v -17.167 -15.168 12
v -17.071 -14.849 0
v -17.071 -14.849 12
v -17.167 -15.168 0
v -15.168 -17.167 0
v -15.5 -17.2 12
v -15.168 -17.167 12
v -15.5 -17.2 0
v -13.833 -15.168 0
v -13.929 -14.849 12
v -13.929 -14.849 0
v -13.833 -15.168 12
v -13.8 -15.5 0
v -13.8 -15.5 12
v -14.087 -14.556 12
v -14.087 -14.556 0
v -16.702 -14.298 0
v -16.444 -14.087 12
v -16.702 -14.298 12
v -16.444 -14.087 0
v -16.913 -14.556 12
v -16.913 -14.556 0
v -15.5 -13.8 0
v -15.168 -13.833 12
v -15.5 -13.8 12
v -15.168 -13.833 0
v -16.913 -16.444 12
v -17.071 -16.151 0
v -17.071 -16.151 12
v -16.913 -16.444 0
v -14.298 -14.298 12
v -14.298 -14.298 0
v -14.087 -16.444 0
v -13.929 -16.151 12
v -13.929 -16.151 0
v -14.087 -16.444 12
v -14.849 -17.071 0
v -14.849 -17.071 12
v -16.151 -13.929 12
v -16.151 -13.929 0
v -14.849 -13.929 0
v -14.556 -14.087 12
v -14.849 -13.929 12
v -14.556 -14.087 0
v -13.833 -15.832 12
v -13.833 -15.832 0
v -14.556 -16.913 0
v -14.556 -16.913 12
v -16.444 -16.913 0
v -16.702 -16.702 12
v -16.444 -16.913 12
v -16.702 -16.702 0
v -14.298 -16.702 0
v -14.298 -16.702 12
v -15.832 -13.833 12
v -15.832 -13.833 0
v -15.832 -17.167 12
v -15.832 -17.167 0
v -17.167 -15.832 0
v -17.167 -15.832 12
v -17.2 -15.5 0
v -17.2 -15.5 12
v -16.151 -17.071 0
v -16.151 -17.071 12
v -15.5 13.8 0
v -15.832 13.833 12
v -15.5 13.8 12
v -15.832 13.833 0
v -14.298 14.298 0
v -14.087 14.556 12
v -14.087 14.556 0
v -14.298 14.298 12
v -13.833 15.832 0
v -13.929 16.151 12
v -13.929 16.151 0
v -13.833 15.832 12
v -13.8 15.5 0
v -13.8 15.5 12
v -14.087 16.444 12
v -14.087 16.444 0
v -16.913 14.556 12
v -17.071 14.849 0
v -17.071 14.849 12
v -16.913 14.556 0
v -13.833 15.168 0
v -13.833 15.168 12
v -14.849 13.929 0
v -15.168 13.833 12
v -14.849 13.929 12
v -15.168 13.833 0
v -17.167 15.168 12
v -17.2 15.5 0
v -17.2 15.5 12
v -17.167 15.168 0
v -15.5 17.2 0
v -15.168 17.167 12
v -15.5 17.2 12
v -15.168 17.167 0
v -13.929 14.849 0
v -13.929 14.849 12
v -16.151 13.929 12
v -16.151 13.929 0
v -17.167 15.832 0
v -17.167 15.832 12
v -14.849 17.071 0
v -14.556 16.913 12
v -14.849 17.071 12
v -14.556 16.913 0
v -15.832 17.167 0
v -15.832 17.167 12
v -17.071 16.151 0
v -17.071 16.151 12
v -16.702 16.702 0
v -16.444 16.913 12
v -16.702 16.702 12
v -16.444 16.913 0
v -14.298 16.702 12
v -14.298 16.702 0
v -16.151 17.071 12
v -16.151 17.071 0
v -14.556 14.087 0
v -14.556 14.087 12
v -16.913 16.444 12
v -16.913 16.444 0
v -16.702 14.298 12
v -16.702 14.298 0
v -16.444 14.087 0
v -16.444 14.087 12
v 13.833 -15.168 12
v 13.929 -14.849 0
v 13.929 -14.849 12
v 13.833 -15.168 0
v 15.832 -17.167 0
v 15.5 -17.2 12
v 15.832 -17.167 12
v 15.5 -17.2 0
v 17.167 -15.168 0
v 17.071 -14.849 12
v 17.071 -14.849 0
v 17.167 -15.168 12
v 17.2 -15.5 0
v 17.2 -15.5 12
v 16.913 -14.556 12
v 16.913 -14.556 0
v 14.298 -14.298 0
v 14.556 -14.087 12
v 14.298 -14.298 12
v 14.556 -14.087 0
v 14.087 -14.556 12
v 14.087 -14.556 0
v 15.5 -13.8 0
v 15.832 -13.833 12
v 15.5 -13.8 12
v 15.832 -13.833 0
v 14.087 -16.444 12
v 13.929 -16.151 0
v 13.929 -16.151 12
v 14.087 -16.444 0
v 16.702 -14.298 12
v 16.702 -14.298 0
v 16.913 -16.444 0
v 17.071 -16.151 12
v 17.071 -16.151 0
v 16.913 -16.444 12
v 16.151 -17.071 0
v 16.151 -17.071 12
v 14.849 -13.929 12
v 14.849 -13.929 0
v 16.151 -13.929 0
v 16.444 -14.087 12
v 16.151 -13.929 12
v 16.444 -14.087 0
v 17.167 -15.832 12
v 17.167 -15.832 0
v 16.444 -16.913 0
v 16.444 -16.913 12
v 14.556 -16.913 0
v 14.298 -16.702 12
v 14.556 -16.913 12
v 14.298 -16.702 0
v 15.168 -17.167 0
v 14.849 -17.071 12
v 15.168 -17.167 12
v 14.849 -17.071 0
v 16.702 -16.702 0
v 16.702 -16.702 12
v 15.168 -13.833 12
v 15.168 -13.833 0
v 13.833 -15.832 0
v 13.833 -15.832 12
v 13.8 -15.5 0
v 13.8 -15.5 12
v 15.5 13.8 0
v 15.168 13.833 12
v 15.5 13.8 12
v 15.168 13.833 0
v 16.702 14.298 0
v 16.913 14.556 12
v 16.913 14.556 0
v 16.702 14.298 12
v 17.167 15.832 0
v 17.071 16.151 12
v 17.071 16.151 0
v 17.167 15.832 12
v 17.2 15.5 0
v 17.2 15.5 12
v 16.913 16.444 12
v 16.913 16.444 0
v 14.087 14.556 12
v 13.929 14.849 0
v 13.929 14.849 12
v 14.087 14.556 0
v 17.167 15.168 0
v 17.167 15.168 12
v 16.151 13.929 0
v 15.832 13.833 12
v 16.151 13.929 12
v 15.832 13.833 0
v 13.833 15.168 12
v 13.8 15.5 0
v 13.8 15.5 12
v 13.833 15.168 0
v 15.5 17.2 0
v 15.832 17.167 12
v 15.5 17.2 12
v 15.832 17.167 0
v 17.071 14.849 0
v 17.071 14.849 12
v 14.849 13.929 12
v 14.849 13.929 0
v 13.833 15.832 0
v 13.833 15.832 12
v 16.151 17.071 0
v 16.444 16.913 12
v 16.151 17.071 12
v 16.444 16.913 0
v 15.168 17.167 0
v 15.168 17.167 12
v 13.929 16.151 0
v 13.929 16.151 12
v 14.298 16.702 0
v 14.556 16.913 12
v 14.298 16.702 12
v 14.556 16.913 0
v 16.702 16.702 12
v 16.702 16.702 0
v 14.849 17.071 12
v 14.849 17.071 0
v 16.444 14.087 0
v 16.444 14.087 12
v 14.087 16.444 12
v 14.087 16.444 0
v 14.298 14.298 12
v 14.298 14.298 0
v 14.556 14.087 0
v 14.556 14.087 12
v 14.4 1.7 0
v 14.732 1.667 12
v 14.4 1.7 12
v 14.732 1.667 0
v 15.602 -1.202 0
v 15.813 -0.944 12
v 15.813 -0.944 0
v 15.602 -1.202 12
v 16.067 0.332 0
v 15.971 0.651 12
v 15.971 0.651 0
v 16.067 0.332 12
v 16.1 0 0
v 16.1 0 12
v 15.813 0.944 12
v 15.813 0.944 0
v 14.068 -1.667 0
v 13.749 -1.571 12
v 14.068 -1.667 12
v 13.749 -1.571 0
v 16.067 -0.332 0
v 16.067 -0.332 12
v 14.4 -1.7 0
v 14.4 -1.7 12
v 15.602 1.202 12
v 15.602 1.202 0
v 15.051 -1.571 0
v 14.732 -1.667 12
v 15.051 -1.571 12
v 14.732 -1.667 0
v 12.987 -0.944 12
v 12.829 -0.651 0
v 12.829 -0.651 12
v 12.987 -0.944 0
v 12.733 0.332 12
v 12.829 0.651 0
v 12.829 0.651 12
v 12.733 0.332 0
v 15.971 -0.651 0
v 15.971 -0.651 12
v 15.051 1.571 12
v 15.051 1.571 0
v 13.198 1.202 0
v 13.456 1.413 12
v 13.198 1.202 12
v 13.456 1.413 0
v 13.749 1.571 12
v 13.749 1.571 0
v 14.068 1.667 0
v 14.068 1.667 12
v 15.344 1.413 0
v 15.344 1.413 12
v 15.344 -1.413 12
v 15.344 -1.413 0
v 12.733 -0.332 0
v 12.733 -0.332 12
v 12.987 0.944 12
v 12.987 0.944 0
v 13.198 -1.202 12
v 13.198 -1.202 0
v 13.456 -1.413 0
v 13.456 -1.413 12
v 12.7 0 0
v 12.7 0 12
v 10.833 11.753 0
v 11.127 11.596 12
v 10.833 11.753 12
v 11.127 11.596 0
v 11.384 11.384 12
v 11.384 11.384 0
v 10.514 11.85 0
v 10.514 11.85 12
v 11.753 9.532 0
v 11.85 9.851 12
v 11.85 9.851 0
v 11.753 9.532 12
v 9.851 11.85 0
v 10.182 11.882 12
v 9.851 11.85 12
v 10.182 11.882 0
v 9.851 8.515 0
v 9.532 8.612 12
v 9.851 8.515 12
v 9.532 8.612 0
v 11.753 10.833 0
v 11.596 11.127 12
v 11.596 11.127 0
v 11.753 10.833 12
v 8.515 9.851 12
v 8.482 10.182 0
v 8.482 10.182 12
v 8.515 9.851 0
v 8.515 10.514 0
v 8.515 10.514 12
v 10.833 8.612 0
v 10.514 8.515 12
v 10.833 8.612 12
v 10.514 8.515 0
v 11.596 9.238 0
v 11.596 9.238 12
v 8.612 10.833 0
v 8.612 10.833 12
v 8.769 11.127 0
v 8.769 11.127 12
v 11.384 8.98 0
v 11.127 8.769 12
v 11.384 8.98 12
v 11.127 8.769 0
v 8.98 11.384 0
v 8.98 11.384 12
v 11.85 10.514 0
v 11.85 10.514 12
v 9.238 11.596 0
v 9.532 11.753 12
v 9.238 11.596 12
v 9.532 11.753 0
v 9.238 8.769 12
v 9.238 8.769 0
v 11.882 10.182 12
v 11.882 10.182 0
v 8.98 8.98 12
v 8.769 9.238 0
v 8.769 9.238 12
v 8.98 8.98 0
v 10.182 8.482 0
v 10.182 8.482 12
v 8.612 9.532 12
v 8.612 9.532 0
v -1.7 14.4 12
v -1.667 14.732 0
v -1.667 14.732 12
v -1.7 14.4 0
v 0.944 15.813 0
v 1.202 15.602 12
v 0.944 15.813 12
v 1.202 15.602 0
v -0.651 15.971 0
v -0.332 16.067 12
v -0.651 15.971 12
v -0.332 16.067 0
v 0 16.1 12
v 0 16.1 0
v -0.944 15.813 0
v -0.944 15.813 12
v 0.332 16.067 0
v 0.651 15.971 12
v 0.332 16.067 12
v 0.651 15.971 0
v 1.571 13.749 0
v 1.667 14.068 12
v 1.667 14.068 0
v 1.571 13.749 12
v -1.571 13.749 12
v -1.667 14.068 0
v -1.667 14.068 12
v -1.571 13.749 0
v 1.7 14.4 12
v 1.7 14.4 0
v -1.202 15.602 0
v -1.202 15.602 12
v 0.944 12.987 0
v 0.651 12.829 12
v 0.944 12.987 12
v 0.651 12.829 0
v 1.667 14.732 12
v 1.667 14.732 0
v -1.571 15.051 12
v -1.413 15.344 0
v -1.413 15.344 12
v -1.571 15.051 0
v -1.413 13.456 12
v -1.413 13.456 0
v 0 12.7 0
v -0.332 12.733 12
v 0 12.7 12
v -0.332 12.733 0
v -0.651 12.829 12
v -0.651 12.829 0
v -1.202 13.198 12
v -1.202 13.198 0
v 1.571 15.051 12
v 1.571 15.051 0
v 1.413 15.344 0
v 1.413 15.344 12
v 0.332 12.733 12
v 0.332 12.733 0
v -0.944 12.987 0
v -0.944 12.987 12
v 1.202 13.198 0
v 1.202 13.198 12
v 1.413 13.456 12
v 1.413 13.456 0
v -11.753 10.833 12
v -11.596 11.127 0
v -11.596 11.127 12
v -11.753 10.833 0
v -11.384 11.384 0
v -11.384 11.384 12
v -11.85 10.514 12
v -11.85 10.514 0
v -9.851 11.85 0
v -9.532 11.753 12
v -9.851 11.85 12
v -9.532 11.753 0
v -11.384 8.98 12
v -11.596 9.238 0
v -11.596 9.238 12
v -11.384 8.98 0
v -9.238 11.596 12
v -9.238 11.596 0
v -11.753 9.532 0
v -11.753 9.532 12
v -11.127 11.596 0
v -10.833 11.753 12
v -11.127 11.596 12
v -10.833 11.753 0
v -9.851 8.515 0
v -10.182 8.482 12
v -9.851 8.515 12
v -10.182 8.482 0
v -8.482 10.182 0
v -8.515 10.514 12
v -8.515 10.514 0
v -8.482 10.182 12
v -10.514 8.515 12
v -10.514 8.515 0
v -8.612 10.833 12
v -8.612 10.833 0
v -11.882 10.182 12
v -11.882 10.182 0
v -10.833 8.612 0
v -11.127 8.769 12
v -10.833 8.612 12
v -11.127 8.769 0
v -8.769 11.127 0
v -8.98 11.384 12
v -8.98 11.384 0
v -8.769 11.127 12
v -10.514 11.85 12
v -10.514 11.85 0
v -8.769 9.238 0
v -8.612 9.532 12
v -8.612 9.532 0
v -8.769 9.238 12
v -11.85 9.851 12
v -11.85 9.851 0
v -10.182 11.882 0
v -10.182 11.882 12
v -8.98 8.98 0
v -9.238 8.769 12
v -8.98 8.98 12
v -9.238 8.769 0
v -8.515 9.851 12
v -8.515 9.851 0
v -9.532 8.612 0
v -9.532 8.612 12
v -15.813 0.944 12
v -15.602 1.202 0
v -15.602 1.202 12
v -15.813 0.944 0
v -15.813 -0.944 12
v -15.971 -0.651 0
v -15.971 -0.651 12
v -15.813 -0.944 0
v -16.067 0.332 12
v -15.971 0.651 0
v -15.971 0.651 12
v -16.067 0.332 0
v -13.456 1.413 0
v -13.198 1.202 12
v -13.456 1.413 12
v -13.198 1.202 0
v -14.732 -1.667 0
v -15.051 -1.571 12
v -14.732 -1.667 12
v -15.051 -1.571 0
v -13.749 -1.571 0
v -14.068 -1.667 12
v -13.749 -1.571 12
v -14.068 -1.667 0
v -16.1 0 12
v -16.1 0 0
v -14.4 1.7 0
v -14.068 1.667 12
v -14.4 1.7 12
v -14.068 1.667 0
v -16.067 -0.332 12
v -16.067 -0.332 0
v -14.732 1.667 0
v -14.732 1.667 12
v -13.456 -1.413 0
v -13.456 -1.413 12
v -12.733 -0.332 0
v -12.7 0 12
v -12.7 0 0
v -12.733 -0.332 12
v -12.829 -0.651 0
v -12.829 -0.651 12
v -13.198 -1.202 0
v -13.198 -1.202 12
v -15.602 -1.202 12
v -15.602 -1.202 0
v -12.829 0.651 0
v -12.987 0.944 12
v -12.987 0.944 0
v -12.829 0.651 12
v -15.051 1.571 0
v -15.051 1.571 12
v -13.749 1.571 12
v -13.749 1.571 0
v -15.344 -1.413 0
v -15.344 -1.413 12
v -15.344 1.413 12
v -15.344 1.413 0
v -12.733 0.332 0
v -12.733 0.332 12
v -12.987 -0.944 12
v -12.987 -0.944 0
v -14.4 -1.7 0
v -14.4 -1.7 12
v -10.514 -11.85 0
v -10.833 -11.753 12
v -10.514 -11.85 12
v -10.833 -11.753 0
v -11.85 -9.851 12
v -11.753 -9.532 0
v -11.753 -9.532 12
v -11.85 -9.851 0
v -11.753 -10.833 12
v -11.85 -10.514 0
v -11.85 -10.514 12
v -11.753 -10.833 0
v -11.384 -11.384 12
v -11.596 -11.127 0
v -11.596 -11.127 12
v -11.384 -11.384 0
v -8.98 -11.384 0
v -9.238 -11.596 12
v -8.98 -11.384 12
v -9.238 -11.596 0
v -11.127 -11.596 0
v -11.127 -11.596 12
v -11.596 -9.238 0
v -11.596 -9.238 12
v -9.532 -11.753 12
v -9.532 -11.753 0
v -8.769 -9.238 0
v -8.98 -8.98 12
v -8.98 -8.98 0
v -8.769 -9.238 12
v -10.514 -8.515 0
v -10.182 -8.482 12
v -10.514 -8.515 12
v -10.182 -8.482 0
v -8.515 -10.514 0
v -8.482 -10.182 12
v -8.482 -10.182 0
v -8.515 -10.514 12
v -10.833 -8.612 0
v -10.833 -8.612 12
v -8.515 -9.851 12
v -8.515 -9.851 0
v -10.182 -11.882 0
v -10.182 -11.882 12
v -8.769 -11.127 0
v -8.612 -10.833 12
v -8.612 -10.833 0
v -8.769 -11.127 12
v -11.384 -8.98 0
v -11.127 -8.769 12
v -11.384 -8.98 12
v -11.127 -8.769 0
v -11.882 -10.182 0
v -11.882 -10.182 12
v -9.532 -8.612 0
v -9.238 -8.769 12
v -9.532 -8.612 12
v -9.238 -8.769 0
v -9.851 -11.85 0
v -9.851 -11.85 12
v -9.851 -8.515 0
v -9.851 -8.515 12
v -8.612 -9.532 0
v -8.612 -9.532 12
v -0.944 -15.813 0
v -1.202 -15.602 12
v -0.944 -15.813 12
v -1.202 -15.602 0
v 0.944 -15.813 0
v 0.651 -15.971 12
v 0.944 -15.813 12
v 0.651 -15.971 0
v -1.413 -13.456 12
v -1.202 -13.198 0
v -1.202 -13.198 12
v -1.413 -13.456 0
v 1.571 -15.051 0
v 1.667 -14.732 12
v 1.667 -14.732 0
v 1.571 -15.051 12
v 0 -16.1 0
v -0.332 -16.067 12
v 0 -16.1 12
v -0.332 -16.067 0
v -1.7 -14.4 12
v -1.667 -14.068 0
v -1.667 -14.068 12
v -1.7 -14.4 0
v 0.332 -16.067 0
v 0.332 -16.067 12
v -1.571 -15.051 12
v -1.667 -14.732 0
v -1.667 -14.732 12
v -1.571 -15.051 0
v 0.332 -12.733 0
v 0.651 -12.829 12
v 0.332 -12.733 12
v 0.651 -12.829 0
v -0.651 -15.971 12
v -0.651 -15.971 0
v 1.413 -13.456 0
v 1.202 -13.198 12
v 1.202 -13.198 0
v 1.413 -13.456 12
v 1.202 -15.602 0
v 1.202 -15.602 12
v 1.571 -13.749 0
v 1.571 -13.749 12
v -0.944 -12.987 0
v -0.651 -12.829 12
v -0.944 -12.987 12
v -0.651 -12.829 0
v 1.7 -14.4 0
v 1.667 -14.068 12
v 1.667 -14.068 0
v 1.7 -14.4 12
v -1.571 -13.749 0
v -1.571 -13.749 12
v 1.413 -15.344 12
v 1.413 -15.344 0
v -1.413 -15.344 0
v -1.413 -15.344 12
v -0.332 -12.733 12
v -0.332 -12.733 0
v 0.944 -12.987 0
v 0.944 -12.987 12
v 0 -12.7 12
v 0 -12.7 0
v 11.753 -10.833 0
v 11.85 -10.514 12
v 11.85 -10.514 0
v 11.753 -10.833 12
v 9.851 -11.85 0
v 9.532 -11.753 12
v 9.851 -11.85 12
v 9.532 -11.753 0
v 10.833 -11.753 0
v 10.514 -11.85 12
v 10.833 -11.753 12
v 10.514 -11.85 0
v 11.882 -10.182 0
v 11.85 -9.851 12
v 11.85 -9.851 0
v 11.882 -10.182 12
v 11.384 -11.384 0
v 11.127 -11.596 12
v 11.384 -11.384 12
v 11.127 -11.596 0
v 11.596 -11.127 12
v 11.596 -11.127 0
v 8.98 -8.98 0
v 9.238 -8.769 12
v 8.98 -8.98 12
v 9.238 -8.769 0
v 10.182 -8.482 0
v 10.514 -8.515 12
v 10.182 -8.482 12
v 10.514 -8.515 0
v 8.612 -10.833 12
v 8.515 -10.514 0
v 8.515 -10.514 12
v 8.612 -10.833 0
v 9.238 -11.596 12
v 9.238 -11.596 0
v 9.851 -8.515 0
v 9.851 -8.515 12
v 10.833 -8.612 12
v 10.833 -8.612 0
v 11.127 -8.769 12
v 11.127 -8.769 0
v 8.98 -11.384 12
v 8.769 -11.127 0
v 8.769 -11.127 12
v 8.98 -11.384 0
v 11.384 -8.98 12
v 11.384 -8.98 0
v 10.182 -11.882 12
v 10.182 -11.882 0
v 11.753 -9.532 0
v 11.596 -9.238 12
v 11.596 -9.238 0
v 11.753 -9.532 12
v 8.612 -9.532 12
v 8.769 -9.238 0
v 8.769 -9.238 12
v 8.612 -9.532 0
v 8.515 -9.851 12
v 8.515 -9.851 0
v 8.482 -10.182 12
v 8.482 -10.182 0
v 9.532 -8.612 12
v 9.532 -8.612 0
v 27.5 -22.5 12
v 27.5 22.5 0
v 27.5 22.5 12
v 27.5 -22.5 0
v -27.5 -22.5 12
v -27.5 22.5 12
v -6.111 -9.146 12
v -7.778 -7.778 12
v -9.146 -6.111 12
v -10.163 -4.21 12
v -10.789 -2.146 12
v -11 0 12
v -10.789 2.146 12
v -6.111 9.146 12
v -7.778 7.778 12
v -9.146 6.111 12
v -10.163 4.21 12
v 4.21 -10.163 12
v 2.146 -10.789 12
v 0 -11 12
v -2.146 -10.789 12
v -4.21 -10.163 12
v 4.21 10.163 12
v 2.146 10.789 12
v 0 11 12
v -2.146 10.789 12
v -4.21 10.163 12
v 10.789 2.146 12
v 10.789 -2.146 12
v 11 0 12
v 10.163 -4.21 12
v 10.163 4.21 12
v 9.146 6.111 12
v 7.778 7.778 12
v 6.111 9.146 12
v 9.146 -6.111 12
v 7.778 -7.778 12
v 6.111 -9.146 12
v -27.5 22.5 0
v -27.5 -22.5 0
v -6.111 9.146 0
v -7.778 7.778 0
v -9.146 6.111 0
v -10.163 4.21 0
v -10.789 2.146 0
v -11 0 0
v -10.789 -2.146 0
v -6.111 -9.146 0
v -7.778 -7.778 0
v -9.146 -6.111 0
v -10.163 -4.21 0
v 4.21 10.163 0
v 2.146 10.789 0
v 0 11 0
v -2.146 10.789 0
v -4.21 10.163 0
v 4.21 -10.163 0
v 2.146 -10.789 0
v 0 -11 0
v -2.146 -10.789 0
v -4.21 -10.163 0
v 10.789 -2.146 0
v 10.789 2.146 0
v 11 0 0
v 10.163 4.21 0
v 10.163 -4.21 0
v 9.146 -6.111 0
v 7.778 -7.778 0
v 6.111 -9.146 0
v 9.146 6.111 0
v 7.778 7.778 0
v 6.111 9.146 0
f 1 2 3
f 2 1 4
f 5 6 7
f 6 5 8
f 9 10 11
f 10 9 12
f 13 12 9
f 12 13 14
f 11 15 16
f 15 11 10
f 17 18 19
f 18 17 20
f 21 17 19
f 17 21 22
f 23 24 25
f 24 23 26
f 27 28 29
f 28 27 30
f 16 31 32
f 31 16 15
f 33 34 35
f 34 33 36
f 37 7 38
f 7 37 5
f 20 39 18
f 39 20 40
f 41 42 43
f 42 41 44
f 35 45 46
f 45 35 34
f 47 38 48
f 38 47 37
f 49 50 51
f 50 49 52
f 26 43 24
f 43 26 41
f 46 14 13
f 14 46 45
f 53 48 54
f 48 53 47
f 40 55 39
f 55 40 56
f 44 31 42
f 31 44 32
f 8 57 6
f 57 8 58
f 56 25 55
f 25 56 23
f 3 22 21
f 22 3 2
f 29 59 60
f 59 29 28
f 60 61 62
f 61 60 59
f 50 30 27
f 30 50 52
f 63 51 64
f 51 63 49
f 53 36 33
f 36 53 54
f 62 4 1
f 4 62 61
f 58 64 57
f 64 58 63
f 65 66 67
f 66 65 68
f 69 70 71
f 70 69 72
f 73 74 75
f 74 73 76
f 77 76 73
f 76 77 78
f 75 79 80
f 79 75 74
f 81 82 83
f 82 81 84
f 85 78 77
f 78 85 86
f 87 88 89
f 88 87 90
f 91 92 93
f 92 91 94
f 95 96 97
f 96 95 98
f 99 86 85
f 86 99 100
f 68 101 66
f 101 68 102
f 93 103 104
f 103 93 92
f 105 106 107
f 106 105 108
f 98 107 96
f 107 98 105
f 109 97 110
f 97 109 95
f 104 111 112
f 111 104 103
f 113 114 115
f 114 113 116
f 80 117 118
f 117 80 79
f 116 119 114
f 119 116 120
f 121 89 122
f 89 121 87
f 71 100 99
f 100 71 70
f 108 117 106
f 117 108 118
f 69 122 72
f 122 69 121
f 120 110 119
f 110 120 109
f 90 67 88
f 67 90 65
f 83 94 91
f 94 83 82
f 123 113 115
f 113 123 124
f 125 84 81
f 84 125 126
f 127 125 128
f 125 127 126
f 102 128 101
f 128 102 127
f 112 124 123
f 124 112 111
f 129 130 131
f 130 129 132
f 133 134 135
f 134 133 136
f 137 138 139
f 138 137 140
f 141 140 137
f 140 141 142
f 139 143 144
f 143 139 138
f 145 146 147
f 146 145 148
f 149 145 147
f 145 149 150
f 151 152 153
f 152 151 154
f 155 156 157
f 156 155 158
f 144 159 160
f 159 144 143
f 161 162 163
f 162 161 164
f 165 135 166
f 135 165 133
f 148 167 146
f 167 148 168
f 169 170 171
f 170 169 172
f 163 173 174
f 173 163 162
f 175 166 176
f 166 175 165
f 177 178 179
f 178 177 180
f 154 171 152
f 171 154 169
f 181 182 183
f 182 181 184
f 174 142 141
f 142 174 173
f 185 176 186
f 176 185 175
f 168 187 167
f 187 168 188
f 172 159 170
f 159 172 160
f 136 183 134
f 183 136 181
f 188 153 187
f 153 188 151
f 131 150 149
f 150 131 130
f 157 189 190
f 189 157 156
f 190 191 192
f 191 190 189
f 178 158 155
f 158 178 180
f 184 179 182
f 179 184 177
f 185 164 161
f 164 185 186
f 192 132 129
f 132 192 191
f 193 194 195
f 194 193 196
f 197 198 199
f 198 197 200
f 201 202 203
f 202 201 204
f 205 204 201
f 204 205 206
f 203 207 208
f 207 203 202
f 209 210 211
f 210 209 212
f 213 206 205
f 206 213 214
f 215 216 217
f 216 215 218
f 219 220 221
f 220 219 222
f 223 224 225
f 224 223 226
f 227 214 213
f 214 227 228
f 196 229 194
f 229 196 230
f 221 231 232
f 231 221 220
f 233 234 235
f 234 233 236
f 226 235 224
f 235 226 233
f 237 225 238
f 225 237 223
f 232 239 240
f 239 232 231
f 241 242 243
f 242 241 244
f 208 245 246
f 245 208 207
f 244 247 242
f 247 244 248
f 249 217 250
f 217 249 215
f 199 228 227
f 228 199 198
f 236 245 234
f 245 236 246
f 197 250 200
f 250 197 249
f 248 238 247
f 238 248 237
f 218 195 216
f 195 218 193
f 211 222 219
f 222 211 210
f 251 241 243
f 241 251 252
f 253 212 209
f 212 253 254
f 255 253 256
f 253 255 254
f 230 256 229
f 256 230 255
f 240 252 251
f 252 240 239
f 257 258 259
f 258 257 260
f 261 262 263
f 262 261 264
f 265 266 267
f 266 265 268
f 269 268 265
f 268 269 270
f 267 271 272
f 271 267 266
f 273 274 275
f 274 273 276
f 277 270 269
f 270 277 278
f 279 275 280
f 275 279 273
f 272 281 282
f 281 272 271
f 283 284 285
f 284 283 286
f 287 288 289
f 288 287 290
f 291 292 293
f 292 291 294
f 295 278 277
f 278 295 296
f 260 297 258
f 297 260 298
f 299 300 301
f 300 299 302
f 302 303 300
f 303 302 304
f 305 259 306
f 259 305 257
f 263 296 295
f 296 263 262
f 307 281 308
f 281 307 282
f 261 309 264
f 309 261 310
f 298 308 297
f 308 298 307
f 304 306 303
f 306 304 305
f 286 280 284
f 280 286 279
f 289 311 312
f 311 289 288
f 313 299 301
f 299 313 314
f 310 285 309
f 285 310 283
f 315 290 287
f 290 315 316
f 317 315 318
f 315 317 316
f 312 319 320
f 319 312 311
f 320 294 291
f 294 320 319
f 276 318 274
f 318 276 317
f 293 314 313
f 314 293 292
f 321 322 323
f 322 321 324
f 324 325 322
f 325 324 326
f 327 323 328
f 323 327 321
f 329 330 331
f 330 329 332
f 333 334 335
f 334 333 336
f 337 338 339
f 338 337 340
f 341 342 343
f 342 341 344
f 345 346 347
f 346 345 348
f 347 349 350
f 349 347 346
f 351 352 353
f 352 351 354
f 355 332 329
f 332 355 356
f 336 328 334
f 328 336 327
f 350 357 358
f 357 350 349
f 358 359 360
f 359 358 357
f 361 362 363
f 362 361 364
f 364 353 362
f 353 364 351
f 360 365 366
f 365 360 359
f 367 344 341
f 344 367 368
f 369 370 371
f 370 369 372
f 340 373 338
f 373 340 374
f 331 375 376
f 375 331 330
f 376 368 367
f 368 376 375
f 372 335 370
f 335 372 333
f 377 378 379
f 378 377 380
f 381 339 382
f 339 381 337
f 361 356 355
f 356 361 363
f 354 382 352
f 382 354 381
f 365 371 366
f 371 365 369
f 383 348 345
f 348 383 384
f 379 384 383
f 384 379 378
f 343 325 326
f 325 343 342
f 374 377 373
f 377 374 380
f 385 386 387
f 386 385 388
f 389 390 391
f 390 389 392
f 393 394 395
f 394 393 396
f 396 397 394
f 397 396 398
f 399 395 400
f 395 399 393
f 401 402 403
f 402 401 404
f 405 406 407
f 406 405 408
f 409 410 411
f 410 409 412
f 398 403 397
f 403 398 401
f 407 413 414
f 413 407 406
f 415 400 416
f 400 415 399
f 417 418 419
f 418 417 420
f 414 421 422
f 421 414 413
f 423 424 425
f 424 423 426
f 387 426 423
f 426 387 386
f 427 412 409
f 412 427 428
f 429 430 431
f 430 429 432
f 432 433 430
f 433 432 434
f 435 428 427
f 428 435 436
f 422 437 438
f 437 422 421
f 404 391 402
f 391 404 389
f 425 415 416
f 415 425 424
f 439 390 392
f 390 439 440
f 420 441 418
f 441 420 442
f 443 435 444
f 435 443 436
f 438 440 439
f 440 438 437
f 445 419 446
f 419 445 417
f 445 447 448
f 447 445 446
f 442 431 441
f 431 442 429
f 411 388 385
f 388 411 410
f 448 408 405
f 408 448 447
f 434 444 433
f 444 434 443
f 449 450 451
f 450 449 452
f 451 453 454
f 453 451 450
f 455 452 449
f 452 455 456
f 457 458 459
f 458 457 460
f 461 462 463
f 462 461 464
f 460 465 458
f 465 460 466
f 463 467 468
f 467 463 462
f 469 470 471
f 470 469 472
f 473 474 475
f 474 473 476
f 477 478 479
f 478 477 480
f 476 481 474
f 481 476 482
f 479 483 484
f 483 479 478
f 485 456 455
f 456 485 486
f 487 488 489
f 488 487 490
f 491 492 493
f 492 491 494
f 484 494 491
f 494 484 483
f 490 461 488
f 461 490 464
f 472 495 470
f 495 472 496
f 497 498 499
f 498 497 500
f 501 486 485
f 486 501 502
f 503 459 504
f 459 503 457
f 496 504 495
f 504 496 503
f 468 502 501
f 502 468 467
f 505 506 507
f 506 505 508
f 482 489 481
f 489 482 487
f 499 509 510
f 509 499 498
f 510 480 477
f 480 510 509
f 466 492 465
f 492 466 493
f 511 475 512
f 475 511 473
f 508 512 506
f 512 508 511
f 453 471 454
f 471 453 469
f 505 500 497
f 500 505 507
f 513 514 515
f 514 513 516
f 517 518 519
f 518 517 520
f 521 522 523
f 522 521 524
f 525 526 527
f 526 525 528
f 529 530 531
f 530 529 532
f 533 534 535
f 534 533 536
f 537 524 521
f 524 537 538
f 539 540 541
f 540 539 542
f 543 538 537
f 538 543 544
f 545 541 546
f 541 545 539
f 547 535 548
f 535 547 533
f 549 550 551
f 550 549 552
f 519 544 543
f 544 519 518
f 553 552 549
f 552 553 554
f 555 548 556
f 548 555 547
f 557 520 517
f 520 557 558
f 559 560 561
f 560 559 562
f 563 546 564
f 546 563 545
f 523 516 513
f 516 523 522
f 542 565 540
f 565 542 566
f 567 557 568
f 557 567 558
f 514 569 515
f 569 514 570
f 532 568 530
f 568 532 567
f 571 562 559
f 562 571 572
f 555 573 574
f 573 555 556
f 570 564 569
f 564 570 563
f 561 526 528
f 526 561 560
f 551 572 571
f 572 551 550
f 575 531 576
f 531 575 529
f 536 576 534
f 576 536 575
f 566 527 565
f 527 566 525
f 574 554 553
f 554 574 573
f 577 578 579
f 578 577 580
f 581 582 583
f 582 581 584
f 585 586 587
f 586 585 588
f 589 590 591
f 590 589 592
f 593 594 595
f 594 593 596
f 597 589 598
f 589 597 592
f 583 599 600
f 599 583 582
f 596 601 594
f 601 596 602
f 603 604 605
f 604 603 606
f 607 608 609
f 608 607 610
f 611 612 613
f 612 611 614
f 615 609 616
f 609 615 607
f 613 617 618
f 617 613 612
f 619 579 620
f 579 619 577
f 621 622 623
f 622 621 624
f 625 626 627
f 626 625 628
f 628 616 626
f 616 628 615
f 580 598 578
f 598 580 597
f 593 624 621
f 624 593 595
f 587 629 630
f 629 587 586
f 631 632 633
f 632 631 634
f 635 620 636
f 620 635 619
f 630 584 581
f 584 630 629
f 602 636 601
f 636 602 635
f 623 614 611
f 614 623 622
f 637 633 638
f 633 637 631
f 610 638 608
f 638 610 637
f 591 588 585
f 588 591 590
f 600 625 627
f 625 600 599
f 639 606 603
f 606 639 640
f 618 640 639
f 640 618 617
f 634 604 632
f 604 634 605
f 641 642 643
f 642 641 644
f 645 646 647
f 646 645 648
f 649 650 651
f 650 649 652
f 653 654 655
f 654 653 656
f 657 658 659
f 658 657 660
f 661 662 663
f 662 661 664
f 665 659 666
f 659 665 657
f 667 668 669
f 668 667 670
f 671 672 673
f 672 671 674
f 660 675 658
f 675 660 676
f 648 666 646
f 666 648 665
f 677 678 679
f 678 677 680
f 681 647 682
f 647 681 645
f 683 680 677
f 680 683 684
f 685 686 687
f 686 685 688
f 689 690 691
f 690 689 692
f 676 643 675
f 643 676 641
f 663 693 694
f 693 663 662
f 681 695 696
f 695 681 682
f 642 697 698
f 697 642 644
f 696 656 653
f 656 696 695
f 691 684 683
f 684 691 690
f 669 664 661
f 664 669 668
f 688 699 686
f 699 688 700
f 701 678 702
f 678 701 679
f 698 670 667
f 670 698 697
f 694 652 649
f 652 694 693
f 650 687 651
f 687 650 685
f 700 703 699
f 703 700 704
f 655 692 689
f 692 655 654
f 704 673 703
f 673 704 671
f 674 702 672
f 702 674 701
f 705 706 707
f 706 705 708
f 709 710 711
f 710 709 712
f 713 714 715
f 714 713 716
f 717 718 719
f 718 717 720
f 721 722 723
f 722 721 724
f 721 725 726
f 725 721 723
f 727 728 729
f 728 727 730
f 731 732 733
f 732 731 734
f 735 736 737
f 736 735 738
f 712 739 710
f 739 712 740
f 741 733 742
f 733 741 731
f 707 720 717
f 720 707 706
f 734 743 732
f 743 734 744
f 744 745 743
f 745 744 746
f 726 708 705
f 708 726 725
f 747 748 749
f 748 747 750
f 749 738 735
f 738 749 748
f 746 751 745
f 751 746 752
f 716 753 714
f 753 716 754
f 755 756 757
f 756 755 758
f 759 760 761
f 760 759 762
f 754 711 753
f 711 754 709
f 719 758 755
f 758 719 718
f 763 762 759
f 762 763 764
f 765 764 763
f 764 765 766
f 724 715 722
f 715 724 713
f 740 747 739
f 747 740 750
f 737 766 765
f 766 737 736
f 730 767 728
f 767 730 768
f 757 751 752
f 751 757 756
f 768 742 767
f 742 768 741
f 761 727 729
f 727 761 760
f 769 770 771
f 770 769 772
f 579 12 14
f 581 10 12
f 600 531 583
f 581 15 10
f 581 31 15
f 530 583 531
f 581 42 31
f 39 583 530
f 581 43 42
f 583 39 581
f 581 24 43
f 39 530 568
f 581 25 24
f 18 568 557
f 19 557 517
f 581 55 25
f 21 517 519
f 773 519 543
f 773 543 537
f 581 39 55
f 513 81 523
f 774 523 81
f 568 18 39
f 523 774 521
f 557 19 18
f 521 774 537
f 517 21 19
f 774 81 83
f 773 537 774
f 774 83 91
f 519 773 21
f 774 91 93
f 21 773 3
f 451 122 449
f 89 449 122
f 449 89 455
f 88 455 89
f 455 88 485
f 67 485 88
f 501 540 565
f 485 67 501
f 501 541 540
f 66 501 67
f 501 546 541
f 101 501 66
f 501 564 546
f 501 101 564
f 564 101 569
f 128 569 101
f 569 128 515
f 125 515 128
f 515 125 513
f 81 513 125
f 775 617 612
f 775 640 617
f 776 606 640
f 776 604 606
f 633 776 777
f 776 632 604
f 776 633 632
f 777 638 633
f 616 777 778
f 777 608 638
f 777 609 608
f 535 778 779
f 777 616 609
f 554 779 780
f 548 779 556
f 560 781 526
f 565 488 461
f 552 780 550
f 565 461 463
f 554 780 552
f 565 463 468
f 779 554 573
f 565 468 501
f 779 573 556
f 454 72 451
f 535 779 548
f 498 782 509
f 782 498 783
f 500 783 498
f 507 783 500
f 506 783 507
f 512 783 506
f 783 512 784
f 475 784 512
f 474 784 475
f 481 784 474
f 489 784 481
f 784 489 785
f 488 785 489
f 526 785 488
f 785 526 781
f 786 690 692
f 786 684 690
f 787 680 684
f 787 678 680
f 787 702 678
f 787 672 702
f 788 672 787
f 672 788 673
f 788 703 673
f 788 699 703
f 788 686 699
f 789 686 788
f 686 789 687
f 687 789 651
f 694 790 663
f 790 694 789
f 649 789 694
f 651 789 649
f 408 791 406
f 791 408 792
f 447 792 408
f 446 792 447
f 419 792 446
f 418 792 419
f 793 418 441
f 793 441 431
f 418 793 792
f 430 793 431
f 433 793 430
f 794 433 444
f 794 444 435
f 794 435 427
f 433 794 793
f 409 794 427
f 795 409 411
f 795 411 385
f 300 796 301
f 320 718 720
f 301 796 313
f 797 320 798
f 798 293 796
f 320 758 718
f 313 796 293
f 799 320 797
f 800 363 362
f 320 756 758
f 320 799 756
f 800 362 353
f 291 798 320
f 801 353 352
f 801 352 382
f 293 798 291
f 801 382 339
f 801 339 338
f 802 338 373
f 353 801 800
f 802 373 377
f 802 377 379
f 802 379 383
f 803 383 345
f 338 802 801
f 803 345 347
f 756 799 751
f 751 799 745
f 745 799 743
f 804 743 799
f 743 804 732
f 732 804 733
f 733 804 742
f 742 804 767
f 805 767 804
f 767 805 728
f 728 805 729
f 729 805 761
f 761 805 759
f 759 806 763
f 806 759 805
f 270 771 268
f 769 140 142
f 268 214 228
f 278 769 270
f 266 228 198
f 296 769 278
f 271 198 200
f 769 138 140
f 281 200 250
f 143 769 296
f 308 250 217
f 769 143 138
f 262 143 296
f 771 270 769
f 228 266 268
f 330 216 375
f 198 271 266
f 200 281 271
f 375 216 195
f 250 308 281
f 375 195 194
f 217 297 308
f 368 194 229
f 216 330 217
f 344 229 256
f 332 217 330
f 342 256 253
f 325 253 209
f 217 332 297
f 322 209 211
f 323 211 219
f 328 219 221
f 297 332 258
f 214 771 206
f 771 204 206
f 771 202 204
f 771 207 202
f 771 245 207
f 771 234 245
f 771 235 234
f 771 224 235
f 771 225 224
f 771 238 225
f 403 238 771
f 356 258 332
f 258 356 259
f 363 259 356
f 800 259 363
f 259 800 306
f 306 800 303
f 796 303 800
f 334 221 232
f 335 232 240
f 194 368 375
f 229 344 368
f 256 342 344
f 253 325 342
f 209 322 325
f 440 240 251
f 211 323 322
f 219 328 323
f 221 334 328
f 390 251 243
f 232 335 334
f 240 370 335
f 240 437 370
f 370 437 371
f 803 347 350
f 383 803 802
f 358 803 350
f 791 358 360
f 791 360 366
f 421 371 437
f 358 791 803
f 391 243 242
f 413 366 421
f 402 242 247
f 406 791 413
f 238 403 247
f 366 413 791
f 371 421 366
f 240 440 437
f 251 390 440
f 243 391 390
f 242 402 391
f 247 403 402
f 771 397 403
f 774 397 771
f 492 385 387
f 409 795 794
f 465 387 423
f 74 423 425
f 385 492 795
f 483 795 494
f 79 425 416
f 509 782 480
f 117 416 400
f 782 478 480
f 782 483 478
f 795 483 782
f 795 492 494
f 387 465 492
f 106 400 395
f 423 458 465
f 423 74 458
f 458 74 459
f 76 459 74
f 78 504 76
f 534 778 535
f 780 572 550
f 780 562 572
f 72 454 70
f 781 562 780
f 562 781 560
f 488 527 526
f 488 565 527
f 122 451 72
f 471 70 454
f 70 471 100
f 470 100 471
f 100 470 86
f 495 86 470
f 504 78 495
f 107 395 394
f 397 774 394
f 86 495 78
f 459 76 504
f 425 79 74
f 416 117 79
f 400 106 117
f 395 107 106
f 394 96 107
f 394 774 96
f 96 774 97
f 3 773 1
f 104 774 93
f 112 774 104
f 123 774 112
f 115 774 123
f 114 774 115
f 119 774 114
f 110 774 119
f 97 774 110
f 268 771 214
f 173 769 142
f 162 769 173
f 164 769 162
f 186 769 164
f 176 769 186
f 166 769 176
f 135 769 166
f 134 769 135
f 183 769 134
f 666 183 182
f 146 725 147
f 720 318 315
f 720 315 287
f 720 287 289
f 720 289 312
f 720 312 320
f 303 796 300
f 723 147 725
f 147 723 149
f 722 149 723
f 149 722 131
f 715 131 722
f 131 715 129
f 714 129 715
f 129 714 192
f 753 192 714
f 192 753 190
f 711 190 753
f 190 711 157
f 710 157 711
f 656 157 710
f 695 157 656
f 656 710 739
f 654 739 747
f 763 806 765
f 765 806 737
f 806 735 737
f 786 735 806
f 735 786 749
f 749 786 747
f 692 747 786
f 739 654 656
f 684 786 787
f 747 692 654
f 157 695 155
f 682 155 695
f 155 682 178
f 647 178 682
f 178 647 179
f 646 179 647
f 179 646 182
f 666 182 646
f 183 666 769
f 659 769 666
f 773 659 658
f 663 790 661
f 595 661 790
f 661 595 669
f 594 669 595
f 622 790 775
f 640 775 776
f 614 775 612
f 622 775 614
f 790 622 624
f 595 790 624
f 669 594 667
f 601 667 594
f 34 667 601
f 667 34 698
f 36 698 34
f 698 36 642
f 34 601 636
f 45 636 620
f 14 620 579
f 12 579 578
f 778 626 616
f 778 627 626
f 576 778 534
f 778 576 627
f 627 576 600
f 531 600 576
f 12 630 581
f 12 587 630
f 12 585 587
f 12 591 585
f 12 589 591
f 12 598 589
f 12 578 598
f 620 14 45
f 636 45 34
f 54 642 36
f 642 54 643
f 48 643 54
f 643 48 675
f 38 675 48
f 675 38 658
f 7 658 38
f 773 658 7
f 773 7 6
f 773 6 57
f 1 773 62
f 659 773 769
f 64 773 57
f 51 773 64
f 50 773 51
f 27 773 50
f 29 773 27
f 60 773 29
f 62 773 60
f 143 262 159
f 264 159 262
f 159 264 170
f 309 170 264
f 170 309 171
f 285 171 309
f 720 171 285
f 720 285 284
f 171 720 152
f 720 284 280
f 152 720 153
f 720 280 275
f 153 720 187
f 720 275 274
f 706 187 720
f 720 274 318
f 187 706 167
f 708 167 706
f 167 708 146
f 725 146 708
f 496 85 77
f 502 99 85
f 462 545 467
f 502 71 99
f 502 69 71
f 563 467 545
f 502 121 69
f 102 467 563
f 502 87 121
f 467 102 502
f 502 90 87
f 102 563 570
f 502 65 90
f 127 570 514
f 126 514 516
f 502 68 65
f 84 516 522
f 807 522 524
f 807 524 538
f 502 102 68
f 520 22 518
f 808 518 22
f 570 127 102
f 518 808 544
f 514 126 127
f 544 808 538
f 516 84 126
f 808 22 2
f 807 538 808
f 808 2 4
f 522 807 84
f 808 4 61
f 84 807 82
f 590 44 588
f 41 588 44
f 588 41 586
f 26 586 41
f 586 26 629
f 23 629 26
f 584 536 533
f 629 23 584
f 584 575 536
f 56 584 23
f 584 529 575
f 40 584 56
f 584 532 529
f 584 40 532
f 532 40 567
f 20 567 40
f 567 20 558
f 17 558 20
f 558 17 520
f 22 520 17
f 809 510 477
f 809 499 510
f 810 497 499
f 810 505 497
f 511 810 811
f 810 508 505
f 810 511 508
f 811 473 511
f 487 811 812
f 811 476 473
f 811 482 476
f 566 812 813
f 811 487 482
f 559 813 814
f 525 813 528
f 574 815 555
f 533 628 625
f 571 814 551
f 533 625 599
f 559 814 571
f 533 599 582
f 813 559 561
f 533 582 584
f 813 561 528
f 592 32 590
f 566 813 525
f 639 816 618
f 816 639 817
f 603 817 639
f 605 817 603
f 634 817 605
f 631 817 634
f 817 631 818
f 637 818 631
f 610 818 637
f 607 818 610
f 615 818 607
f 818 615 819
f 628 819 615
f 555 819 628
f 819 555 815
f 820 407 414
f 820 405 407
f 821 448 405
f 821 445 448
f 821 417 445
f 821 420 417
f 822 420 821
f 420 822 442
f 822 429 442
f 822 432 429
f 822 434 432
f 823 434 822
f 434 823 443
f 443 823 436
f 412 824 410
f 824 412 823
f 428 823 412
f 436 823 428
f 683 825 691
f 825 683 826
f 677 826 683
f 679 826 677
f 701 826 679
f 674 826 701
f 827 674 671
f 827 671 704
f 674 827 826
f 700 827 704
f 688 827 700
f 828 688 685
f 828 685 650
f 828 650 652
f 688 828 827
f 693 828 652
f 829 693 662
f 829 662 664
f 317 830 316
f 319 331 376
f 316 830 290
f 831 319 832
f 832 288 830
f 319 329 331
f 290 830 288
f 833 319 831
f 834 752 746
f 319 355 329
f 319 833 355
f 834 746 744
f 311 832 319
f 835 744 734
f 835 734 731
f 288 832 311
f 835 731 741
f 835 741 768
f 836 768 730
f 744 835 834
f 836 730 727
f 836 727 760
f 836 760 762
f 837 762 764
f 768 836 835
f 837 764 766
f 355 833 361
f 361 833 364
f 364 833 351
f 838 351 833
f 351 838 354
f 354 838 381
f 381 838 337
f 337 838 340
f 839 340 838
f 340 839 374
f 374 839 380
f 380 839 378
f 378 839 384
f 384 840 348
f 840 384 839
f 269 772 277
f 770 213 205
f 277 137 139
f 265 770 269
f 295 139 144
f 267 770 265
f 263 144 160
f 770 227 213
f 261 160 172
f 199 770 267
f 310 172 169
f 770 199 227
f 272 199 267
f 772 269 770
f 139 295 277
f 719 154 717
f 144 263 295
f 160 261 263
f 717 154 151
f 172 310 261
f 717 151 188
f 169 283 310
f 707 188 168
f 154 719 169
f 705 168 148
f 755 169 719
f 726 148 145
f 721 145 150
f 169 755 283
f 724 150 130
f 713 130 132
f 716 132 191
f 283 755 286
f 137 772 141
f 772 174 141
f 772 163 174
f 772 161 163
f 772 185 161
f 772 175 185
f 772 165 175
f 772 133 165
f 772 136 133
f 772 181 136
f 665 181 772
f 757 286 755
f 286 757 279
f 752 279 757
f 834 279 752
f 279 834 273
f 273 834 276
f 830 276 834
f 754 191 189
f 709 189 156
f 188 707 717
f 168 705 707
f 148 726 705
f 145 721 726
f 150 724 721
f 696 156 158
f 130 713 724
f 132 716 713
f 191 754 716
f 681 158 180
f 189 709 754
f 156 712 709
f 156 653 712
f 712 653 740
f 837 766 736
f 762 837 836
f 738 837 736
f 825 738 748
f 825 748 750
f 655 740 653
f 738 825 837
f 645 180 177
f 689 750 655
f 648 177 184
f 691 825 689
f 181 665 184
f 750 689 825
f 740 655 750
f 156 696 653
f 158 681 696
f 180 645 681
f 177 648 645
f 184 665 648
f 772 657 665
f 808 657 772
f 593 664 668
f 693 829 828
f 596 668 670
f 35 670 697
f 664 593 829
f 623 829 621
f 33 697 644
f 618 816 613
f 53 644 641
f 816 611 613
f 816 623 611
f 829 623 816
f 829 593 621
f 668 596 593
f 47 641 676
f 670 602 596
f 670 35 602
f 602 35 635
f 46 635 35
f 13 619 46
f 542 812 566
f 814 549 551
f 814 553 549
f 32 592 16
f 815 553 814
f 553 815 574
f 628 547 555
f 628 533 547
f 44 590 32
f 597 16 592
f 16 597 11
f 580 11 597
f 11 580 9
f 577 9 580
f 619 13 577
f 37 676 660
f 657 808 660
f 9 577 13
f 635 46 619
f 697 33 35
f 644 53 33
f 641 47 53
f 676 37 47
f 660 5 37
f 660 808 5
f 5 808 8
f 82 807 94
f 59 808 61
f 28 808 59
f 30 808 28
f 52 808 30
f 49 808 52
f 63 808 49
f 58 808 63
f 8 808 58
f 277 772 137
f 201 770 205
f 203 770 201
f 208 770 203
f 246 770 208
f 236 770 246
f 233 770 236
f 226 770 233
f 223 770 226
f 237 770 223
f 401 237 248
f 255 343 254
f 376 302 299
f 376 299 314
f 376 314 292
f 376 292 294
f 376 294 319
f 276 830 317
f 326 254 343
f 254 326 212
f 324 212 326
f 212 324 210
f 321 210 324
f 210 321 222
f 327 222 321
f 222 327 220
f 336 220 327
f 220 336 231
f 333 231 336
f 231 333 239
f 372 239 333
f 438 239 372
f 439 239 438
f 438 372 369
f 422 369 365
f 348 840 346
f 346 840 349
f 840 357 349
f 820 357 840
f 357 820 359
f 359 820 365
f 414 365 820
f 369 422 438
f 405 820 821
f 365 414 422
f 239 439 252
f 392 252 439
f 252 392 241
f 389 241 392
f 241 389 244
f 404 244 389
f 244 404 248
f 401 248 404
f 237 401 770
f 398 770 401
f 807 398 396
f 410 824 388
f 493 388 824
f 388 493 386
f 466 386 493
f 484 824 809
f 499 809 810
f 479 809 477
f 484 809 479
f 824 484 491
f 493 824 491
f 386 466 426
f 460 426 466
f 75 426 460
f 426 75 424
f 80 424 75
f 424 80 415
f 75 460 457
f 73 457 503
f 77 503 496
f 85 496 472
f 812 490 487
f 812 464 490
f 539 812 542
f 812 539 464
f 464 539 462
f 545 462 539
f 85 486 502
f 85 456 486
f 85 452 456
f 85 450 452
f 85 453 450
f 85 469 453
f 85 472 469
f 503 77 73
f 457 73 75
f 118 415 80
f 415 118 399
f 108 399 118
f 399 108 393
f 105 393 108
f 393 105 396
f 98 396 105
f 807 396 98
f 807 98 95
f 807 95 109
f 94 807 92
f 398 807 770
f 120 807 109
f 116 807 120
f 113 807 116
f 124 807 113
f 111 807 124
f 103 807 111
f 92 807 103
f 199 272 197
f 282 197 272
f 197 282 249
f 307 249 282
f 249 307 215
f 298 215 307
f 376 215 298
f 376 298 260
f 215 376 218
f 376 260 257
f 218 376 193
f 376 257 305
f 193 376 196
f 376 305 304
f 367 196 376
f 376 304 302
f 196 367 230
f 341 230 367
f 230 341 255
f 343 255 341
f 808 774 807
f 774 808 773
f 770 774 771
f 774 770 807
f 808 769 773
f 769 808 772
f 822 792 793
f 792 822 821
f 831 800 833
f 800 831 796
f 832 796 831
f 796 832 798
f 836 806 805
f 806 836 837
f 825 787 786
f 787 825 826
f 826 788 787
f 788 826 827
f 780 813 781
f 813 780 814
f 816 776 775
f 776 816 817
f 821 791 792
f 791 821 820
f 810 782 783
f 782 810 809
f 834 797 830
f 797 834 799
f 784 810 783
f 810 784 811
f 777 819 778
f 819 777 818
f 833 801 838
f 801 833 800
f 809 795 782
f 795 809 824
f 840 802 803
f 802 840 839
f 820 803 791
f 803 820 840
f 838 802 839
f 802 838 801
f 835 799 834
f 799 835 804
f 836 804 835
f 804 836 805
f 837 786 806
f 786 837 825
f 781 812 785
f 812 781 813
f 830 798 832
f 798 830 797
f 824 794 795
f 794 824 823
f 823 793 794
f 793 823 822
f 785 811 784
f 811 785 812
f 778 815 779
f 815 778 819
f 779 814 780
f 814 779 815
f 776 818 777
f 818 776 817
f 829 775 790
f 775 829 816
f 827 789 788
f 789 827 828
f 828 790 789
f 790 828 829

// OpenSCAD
$fn = 32;

// ----------------------------------------------------------------------
// Motor mount plate: NEMA17, 55 x 45 x 12 mm
// ----------------------------------------------------------------------

// --- parameters (mm) ---
mount_w = 55;             // plate length, X
mount_d = 45;             // plate width, Y
mat_t = 12;               // plate thickness
motor_pitch = 31;         // NEMA17 bolt spacing
motor_d = 3.4;            // NEMA17 screw clearance
center_bore = 22;         // pilot boss bore
second_d = 3.4;           // second fastener hole
bc_r = 14.4;              // second bolt circle radius
bc_n = 8;                 // second bolt circle count

module plate() {
  translate([-mount_w / 2, -mount_d / 2, 0]) cube([mount_w, mount_d, mat_t]);
}

module motor_holes() {
  for (sx = [-1, 1]) for (sy = [-1, 1])
    translate([sx * motor_pitch / 2, sy * motor_pitch / 2, -1])
      cylinder(h = mat_t + 2, d = motor_d);
}

difference() {
  union() {
    plate();
  }
  motor_holes();
  translate([0, 0, -1]) cylinder(h = mat_t + 2, d = center_bore);
  for (i = [0 : bc_n - 1]) rotate([0, 0, i * 360 / bc_n]) translate([bc_r, 0, -1])    cylinder(h = mat_t + 2, d = second_d);
}
